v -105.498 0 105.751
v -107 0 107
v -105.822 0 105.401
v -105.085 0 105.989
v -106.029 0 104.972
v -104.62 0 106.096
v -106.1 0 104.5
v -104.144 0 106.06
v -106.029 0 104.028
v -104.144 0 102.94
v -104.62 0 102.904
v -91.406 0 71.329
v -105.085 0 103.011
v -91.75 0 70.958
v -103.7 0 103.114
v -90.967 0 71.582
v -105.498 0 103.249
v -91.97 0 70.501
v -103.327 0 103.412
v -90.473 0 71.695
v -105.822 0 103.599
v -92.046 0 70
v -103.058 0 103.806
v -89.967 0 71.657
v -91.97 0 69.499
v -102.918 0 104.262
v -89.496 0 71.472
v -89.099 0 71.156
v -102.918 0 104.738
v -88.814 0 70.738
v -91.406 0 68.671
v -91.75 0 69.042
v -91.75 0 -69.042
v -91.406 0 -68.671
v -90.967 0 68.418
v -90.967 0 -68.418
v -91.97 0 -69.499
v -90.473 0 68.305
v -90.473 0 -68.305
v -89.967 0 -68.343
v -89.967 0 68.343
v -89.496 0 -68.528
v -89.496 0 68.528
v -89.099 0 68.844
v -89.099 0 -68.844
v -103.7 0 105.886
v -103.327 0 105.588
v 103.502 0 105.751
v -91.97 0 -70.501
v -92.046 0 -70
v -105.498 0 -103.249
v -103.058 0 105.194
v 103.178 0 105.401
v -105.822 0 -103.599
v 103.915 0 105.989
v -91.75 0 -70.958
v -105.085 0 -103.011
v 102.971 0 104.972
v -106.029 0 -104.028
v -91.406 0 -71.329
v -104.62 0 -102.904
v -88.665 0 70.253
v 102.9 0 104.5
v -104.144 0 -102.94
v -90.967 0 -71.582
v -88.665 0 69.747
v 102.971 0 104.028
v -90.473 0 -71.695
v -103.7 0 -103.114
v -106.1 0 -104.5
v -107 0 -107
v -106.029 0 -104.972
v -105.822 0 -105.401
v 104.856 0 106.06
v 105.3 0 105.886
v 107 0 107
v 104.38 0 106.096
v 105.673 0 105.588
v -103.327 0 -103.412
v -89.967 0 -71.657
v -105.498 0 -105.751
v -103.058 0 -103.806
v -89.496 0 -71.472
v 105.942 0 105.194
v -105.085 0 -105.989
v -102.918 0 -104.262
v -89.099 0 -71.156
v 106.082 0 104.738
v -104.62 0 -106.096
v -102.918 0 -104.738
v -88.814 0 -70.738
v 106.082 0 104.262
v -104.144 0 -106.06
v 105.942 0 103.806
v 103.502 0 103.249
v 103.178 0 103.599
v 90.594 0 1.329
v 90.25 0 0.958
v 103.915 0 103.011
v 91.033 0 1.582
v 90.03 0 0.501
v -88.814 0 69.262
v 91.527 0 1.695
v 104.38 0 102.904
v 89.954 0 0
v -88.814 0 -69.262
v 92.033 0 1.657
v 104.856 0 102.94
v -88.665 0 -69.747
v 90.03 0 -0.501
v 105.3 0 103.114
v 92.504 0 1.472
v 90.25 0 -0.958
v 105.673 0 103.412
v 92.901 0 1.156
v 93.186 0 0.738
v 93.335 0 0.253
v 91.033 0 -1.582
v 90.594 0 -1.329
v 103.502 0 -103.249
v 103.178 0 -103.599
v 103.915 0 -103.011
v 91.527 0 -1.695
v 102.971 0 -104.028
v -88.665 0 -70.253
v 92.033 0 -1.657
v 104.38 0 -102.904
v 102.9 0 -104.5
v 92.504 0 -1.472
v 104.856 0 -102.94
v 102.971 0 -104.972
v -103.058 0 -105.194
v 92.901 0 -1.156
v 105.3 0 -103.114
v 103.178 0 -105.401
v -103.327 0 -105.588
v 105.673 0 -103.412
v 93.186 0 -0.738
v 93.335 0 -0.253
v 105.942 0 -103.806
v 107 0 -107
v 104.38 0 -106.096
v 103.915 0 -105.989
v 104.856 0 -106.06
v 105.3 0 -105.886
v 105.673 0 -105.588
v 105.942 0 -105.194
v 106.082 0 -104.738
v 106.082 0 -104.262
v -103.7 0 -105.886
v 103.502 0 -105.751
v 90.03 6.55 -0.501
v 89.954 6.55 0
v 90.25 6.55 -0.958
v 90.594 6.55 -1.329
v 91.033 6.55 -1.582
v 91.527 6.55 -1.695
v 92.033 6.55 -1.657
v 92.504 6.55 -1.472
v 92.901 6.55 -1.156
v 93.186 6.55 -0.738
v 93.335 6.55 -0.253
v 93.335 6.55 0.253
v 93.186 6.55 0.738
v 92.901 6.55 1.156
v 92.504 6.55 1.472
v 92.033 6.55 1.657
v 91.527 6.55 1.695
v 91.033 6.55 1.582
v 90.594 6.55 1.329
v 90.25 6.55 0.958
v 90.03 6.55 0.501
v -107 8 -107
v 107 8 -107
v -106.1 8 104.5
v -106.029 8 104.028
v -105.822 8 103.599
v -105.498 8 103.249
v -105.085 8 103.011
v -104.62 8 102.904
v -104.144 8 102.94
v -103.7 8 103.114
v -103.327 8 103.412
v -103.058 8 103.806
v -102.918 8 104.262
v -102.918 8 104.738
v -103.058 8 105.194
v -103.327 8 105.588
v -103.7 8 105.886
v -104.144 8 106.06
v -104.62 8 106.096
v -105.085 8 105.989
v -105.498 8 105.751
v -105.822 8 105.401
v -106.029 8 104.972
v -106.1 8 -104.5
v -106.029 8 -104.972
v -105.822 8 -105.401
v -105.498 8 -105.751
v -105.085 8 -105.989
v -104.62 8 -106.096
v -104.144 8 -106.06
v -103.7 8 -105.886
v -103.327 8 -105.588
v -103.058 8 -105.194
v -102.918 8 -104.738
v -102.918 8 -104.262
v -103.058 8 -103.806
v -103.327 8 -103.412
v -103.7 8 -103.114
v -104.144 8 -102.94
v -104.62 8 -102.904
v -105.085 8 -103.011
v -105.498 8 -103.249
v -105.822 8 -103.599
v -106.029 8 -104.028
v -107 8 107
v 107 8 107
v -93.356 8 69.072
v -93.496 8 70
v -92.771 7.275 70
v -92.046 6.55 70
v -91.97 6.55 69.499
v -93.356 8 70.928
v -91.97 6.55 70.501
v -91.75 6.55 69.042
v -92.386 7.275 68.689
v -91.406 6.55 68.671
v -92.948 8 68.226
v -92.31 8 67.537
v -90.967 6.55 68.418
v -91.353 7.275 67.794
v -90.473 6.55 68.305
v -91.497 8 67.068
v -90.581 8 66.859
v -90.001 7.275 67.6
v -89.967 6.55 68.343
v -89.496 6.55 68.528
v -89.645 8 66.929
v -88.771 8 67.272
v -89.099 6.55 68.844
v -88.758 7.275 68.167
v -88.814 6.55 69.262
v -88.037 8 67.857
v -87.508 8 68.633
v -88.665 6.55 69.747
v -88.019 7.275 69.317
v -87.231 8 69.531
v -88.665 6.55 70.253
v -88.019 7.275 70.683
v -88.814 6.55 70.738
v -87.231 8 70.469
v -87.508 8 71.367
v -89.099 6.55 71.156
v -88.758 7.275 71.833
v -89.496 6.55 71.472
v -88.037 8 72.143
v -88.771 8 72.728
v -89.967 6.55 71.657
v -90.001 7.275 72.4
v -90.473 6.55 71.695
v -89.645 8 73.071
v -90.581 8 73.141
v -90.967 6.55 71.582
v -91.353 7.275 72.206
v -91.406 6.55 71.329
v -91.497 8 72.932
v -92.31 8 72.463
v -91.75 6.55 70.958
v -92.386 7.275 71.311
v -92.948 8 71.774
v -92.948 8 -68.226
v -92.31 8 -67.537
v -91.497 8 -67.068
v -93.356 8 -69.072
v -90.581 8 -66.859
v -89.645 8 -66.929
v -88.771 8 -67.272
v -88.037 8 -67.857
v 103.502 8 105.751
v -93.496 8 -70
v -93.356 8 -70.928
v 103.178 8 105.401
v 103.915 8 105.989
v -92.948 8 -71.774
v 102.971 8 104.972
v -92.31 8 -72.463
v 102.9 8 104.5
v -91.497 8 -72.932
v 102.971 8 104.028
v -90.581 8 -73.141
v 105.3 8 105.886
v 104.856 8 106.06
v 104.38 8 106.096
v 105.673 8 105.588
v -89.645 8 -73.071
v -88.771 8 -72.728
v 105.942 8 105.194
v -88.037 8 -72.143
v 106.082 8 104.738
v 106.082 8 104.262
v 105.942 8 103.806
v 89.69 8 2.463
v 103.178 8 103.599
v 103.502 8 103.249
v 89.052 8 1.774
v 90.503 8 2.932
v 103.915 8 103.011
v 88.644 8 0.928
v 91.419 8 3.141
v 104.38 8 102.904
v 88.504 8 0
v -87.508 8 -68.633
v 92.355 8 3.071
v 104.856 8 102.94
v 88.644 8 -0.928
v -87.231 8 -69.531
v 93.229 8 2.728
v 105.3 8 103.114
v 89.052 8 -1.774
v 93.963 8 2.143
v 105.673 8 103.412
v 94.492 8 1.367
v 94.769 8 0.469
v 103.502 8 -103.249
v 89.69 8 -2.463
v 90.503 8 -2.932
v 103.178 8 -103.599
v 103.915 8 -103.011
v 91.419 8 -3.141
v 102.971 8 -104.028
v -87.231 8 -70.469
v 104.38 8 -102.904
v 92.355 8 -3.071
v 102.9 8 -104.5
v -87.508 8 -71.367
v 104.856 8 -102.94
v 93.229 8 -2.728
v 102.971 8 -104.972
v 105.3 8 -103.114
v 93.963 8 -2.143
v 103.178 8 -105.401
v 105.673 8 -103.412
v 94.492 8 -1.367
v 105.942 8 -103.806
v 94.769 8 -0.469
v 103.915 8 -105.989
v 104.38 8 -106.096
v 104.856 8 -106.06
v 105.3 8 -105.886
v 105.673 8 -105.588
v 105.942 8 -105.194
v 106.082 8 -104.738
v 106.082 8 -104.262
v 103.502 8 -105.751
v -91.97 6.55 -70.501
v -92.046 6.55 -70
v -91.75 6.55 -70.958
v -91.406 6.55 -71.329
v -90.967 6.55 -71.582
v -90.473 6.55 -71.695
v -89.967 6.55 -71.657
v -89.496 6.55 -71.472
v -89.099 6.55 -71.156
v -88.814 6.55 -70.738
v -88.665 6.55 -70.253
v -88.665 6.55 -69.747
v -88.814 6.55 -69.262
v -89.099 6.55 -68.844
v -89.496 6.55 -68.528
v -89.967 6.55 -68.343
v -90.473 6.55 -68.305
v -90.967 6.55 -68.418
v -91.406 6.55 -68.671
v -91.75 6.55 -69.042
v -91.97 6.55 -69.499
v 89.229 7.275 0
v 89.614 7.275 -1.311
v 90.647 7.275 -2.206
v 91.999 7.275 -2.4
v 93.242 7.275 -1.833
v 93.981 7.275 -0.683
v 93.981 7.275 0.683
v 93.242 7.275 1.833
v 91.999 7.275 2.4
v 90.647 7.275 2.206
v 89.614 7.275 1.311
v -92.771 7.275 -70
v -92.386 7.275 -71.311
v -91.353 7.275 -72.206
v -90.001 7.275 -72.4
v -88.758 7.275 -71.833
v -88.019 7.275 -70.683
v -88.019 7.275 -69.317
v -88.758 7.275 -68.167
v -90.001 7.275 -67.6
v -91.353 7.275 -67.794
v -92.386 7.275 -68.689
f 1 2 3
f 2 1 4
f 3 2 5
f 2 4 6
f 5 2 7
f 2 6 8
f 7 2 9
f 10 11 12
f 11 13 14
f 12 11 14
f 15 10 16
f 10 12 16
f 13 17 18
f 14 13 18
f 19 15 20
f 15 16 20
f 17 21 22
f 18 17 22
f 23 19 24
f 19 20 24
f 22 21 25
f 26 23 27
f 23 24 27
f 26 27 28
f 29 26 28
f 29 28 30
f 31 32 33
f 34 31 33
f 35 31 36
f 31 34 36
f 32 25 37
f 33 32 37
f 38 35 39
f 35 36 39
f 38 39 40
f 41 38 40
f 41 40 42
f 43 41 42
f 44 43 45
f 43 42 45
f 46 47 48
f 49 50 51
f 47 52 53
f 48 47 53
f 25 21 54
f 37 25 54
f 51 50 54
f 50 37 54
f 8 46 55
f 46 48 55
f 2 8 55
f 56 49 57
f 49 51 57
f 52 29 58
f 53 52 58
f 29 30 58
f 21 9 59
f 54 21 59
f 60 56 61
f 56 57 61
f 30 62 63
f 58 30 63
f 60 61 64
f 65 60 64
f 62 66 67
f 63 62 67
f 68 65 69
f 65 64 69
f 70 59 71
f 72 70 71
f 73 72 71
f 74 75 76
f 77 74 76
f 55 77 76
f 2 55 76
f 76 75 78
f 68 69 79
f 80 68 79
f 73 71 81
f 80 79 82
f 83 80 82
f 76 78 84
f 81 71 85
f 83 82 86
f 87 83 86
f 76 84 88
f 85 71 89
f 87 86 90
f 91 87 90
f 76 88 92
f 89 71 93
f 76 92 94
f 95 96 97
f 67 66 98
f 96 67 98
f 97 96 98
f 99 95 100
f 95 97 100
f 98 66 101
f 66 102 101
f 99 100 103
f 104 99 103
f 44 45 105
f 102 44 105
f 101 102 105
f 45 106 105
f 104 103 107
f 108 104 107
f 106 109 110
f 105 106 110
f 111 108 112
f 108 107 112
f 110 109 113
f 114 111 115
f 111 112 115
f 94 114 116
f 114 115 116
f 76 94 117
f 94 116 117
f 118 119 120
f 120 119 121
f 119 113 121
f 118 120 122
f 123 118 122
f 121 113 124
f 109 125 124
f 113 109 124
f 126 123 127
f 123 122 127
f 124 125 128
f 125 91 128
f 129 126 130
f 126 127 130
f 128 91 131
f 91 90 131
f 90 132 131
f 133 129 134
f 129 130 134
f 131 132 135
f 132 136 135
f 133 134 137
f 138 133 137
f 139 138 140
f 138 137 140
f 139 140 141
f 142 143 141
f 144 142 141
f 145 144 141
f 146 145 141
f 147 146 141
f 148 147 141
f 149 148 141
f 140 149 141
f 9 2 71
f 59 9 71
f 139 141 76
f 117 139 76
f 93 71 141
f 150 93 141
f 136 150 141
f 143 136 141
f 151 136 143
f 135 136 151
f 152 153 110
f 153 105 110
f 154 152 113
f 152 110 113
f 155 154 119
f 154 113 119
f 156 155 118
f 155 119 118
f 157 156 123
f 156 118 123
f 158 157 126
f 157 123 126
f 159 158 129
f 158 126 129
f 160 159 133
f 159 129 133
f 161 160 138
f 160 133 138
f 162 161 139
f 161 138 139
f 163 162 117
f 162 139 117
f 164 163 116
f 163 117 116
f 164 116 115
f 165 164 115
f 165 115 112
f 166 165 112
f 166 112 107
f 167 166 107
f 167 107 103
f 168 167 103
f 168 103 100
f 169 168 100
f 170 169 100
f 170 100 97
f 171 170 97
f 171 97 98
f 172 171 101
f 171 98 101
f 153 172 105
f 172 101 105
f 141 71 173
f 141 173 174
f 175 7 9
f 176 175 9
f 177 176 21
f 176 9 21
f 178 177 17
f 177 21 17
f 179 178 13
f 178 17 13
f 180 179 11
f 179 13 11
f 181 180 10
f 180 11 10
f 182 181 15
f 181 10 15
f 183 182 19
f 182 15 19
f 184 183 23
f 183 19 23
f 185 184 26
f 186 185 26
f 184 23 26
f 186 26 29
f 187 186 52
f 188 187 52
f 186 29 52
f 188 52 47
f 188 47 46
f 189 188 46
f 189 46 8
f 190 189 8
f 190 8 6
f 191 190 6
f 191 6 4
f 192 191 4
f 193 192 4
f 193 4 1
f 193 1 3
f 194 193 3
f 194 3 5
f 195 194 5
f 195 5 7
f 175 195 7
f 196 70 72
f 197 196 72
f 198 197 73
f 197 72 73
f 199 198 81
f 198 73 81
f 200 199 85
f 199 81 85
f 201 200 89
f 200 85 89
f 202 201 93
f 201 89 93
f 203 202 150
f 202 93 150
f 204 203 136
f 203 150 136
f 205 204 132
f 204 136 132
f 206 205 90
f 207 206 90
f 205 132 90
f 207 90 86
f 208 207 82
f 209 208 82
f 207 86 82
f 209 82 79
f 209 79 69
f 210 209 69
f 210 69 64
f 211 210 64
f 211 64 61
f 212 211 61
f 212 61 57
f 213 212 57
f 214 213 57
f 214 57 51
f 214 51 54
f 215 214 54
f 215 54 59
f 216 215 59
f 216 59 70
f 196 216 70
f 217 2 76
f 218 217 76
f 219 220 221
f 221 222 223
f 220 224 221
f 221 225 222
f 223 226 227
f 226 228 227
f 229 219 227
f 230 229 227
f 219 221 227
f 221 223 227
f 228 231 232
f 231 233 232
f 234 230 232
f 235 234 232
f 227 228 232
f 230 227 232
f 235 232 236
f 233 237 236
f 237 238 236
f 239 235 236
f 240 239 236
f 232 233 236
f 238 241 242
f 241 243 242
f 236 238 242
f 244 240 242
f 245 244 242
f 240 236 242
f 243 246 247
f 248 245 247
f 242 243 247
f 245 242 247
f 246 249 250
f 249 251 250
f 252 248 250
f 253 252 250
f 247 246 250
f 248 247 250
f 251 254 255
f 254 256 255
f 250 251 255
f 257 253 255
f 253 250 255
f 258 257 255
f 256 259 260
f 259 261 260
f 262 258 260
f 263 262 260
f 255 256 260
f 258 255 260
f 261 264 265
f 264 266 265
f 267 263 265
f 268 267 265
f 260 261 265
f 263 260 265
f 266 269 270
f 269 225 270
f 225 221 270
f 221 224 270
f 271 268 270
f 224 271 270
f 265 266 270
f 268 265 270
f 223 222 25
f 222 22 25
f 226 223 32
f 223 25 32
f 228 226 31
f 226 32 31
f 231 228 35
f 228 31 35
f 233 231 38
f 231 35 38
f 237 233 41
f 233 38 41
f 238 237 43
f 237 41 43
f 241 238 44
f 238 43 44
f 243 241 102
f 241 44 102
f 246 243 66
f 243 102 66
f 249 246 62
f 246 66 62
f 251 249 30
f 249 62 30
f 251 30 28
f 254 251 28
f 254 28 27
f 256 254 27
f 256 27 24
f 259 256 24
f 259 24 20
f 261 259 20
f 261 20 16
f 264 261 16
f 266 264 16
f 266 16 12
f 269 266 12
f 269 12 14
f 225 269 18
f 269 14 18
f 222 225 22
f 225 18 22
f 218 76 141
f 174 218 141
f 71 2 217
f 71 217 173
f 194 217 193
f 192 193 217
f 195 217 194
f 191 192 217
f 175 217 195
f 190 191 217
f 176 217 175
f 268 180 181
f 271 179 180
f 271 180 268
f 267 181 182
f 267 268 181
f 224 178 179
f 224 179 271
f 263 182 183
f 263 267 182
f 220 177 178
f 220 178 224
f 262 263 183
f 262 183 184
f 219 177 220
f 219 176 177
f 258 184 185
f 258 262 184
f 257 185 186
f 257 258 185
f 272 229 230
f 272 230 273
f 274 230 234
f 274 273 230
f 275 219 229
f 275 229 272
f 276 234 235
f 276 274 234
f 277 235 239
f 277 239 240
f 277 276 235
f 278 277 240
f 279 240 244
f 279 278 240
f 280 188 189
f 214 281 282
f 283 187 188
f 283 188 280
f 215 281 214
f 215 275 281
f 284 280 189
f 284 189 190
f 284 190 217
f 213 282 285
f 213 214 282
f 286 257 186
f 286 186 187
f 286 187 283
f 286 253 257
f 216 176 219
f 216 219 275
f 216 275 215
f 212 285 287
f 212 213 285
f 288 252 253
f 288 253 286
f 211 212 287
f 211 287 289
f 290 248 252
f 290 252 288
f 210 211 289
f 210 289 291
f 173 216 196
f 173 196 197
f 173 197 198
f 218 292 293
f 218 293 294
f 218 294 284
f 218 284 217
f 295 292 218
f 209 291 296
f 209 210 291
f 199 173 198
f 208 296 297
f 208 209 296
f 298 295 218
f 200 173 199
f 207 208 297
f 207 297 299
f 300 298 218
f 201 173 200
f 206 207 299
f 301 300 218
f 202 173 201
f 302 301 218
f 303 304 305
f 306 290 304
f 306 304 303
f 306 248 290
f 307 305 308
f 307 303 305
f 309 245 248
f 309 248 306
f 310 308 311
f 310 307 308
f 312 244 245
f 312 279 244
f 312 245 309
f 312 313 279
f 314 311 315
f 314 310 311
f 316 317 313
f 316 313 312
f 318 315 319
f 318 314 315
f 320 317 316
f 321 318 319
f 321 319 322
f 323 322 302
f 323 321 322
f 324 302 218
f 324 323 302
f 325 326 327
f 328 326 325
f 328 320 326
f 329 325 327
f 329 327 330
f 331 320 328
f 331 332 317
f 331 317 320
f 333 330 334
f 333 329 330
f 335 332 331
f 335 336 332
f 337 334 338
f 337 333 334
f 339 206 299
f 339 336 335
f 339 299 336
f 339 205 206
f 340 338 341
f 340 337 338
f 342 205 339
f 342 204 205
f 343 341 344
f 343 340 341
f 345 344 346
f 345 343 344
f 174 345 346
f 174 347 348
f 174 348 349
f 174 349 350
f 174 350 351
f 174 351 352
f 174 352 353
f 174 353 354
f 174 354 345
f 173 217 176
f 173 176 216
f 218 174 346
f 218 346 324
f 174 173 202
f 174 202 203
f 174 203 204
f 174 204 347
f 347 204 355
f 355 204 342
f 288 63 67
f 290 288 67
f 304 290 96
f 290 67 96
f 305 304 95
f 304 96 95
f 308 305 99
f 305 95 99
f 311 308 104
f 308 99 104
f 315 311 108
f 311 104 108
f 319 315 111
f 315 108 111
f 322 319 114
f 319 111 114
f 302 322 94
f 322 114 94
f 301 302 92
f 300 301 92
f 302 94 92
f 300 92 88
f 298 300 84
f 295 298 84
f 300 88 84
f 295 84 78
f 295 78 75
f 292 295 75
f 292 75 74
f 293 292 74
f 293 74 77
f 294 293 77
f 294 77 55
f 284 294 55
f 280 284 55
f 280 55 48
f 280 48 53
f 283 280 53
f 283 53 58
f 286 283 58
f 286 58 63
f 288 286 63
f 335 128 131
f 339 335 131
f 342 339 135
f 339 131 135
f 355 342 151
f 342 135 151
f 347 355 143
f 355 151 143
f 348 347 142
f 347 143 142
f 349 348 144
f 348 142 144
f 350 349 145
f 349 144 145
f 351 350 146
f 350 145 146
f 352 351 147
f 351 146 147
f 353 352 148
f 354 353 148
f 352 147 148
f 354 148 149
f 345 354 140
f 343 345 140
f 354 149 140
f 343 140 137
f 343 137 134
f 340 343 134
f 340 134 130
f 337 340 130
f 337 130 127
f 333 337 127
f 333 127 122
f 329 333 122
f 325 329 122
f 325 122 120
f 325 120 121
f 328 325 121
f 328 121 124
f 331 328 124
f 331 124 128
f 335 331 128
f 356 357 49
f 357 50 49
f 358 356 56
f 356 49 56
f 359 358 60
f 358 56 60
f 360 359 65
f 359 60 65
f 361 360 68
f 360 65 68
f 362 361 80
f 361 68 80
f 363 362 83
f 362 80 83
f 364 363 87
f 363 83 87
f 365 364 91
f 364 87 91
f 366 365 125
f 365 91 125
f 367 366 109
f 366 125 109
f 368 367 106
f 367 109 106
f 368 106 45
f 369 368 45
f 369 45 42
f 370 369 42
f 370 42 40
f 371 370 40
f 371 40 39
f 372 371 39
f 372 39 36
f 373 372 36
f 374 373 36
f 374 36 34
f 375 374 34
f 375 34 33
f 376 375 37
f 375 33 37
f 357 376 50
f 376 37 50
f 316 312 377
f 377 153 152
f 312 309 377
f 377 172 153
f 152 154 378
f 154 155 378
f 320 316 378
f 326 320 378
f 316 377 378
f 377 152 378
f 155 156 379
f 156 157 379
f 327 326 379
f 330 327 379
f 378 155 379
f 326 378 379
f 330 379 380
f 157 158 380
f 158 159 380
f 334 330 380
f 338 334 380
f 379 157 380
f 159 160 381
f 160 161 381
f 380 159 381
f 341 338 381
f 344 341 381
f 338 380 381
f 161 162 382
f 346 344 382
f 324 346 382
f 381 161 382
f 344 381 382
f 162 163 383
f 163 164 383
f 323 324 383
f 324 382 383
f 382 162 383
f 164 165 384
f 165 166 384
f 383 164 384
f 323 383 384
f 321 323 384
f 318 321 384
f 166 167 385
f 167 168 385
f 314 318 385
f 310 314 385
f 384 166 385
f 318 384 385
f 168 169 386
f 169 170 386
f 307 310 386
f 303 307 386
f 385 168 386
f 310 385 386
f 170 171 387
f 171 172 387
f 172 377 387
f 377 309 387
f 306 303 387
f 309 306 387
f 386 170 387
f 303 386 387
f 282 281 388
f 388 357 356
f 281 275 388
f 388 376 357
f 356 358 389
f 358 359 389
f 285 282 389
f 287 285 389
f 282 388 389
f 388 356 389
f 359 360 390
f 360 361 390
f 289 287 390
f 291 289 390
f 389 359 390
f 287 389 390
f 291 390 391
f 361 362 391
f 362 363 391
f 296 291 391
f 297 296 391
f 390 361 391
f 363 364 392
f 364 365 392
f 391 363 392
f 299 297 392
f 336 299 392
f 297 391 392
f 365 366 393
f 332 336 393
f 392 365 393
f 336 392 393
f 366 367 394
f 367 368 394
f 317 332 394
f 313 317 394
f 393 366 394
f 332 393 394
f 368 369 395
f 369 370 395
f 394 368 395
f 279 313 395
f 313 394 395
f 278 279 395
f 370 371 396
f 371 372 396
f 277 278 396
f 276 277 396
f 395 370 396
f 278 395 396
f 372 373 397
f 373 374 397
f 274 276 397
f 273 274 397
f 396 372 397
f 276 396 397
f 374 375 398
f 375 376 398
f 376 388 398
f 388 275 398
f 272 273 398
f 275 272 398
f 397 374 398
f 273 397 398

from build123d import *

# Parameters (mm, degrees)
ESQUISSE1_W                                    = 214
ESQUISSE1_H                                    = 214
BOSS_EXTRU_1_DEPTH                             = 8
D_GAGEMENT_M31_D                               = 3.2
FRAISAGE_POUR_VIS_T_TE_FRAIS_E_M31_D           = 3.4
FRAISAGE_POUR_VIS_T_TE_FRAIS_E_M31_CSINK_D     = 6.3
FRAISAGE_POUR_VIS_T_TE_FRAIS_E_M31_CSINK_ANGLE = 90


with BuildPart() as part:
    # Esquisse1 → Boss.-Extru.1 (new body)
    with BuildSketch(Plane(origin=(0, 0, 0), x_dir=(1, 0, 0), z_dir=(0, 1, 0))):
        Rectangle(ESQUISSE1_W, ESQUISSE1_H)
    extrude(amount=BOSS_EXTRU_1_DEPTH)

    # Dégagement M31 (through all)
    with Locations(Plane(origin=(0, 8, 0), x_dir=(1, 0, 0), z_dir=(0, 1, 0))):
        with Locations((-104.5, -104.5), (-104.5, 104.5), (104.5, 104.5), (104.5, -104.5)):
            Hole(D_GAGEMENT_M31_D / 2)

    # Fraisage pour vis à tête fraisée M31 (through all)
    with Locations(Plane(origin=(0, 8, 0), x_dir=(1, 0, 0), z_dir=(0, 1, 0))):
        with Locations((-90.345684211, 70), (-90.345684211, -70), (91.65431579, 0)):
            CounterSinkHole(FRAISAGE_POUR_VIS_T_TE_FRAIS_E_M31_D / 2, FRAISAGE_POUR_VIS_T_TE_FRAIS_E_M31_CSINK_D / 2, counter_sink_angle=FRAISAGE_POUR_VIS_T_TE_FRAIS_E_M31_CSINK_ANGLE)


solid = part.part
